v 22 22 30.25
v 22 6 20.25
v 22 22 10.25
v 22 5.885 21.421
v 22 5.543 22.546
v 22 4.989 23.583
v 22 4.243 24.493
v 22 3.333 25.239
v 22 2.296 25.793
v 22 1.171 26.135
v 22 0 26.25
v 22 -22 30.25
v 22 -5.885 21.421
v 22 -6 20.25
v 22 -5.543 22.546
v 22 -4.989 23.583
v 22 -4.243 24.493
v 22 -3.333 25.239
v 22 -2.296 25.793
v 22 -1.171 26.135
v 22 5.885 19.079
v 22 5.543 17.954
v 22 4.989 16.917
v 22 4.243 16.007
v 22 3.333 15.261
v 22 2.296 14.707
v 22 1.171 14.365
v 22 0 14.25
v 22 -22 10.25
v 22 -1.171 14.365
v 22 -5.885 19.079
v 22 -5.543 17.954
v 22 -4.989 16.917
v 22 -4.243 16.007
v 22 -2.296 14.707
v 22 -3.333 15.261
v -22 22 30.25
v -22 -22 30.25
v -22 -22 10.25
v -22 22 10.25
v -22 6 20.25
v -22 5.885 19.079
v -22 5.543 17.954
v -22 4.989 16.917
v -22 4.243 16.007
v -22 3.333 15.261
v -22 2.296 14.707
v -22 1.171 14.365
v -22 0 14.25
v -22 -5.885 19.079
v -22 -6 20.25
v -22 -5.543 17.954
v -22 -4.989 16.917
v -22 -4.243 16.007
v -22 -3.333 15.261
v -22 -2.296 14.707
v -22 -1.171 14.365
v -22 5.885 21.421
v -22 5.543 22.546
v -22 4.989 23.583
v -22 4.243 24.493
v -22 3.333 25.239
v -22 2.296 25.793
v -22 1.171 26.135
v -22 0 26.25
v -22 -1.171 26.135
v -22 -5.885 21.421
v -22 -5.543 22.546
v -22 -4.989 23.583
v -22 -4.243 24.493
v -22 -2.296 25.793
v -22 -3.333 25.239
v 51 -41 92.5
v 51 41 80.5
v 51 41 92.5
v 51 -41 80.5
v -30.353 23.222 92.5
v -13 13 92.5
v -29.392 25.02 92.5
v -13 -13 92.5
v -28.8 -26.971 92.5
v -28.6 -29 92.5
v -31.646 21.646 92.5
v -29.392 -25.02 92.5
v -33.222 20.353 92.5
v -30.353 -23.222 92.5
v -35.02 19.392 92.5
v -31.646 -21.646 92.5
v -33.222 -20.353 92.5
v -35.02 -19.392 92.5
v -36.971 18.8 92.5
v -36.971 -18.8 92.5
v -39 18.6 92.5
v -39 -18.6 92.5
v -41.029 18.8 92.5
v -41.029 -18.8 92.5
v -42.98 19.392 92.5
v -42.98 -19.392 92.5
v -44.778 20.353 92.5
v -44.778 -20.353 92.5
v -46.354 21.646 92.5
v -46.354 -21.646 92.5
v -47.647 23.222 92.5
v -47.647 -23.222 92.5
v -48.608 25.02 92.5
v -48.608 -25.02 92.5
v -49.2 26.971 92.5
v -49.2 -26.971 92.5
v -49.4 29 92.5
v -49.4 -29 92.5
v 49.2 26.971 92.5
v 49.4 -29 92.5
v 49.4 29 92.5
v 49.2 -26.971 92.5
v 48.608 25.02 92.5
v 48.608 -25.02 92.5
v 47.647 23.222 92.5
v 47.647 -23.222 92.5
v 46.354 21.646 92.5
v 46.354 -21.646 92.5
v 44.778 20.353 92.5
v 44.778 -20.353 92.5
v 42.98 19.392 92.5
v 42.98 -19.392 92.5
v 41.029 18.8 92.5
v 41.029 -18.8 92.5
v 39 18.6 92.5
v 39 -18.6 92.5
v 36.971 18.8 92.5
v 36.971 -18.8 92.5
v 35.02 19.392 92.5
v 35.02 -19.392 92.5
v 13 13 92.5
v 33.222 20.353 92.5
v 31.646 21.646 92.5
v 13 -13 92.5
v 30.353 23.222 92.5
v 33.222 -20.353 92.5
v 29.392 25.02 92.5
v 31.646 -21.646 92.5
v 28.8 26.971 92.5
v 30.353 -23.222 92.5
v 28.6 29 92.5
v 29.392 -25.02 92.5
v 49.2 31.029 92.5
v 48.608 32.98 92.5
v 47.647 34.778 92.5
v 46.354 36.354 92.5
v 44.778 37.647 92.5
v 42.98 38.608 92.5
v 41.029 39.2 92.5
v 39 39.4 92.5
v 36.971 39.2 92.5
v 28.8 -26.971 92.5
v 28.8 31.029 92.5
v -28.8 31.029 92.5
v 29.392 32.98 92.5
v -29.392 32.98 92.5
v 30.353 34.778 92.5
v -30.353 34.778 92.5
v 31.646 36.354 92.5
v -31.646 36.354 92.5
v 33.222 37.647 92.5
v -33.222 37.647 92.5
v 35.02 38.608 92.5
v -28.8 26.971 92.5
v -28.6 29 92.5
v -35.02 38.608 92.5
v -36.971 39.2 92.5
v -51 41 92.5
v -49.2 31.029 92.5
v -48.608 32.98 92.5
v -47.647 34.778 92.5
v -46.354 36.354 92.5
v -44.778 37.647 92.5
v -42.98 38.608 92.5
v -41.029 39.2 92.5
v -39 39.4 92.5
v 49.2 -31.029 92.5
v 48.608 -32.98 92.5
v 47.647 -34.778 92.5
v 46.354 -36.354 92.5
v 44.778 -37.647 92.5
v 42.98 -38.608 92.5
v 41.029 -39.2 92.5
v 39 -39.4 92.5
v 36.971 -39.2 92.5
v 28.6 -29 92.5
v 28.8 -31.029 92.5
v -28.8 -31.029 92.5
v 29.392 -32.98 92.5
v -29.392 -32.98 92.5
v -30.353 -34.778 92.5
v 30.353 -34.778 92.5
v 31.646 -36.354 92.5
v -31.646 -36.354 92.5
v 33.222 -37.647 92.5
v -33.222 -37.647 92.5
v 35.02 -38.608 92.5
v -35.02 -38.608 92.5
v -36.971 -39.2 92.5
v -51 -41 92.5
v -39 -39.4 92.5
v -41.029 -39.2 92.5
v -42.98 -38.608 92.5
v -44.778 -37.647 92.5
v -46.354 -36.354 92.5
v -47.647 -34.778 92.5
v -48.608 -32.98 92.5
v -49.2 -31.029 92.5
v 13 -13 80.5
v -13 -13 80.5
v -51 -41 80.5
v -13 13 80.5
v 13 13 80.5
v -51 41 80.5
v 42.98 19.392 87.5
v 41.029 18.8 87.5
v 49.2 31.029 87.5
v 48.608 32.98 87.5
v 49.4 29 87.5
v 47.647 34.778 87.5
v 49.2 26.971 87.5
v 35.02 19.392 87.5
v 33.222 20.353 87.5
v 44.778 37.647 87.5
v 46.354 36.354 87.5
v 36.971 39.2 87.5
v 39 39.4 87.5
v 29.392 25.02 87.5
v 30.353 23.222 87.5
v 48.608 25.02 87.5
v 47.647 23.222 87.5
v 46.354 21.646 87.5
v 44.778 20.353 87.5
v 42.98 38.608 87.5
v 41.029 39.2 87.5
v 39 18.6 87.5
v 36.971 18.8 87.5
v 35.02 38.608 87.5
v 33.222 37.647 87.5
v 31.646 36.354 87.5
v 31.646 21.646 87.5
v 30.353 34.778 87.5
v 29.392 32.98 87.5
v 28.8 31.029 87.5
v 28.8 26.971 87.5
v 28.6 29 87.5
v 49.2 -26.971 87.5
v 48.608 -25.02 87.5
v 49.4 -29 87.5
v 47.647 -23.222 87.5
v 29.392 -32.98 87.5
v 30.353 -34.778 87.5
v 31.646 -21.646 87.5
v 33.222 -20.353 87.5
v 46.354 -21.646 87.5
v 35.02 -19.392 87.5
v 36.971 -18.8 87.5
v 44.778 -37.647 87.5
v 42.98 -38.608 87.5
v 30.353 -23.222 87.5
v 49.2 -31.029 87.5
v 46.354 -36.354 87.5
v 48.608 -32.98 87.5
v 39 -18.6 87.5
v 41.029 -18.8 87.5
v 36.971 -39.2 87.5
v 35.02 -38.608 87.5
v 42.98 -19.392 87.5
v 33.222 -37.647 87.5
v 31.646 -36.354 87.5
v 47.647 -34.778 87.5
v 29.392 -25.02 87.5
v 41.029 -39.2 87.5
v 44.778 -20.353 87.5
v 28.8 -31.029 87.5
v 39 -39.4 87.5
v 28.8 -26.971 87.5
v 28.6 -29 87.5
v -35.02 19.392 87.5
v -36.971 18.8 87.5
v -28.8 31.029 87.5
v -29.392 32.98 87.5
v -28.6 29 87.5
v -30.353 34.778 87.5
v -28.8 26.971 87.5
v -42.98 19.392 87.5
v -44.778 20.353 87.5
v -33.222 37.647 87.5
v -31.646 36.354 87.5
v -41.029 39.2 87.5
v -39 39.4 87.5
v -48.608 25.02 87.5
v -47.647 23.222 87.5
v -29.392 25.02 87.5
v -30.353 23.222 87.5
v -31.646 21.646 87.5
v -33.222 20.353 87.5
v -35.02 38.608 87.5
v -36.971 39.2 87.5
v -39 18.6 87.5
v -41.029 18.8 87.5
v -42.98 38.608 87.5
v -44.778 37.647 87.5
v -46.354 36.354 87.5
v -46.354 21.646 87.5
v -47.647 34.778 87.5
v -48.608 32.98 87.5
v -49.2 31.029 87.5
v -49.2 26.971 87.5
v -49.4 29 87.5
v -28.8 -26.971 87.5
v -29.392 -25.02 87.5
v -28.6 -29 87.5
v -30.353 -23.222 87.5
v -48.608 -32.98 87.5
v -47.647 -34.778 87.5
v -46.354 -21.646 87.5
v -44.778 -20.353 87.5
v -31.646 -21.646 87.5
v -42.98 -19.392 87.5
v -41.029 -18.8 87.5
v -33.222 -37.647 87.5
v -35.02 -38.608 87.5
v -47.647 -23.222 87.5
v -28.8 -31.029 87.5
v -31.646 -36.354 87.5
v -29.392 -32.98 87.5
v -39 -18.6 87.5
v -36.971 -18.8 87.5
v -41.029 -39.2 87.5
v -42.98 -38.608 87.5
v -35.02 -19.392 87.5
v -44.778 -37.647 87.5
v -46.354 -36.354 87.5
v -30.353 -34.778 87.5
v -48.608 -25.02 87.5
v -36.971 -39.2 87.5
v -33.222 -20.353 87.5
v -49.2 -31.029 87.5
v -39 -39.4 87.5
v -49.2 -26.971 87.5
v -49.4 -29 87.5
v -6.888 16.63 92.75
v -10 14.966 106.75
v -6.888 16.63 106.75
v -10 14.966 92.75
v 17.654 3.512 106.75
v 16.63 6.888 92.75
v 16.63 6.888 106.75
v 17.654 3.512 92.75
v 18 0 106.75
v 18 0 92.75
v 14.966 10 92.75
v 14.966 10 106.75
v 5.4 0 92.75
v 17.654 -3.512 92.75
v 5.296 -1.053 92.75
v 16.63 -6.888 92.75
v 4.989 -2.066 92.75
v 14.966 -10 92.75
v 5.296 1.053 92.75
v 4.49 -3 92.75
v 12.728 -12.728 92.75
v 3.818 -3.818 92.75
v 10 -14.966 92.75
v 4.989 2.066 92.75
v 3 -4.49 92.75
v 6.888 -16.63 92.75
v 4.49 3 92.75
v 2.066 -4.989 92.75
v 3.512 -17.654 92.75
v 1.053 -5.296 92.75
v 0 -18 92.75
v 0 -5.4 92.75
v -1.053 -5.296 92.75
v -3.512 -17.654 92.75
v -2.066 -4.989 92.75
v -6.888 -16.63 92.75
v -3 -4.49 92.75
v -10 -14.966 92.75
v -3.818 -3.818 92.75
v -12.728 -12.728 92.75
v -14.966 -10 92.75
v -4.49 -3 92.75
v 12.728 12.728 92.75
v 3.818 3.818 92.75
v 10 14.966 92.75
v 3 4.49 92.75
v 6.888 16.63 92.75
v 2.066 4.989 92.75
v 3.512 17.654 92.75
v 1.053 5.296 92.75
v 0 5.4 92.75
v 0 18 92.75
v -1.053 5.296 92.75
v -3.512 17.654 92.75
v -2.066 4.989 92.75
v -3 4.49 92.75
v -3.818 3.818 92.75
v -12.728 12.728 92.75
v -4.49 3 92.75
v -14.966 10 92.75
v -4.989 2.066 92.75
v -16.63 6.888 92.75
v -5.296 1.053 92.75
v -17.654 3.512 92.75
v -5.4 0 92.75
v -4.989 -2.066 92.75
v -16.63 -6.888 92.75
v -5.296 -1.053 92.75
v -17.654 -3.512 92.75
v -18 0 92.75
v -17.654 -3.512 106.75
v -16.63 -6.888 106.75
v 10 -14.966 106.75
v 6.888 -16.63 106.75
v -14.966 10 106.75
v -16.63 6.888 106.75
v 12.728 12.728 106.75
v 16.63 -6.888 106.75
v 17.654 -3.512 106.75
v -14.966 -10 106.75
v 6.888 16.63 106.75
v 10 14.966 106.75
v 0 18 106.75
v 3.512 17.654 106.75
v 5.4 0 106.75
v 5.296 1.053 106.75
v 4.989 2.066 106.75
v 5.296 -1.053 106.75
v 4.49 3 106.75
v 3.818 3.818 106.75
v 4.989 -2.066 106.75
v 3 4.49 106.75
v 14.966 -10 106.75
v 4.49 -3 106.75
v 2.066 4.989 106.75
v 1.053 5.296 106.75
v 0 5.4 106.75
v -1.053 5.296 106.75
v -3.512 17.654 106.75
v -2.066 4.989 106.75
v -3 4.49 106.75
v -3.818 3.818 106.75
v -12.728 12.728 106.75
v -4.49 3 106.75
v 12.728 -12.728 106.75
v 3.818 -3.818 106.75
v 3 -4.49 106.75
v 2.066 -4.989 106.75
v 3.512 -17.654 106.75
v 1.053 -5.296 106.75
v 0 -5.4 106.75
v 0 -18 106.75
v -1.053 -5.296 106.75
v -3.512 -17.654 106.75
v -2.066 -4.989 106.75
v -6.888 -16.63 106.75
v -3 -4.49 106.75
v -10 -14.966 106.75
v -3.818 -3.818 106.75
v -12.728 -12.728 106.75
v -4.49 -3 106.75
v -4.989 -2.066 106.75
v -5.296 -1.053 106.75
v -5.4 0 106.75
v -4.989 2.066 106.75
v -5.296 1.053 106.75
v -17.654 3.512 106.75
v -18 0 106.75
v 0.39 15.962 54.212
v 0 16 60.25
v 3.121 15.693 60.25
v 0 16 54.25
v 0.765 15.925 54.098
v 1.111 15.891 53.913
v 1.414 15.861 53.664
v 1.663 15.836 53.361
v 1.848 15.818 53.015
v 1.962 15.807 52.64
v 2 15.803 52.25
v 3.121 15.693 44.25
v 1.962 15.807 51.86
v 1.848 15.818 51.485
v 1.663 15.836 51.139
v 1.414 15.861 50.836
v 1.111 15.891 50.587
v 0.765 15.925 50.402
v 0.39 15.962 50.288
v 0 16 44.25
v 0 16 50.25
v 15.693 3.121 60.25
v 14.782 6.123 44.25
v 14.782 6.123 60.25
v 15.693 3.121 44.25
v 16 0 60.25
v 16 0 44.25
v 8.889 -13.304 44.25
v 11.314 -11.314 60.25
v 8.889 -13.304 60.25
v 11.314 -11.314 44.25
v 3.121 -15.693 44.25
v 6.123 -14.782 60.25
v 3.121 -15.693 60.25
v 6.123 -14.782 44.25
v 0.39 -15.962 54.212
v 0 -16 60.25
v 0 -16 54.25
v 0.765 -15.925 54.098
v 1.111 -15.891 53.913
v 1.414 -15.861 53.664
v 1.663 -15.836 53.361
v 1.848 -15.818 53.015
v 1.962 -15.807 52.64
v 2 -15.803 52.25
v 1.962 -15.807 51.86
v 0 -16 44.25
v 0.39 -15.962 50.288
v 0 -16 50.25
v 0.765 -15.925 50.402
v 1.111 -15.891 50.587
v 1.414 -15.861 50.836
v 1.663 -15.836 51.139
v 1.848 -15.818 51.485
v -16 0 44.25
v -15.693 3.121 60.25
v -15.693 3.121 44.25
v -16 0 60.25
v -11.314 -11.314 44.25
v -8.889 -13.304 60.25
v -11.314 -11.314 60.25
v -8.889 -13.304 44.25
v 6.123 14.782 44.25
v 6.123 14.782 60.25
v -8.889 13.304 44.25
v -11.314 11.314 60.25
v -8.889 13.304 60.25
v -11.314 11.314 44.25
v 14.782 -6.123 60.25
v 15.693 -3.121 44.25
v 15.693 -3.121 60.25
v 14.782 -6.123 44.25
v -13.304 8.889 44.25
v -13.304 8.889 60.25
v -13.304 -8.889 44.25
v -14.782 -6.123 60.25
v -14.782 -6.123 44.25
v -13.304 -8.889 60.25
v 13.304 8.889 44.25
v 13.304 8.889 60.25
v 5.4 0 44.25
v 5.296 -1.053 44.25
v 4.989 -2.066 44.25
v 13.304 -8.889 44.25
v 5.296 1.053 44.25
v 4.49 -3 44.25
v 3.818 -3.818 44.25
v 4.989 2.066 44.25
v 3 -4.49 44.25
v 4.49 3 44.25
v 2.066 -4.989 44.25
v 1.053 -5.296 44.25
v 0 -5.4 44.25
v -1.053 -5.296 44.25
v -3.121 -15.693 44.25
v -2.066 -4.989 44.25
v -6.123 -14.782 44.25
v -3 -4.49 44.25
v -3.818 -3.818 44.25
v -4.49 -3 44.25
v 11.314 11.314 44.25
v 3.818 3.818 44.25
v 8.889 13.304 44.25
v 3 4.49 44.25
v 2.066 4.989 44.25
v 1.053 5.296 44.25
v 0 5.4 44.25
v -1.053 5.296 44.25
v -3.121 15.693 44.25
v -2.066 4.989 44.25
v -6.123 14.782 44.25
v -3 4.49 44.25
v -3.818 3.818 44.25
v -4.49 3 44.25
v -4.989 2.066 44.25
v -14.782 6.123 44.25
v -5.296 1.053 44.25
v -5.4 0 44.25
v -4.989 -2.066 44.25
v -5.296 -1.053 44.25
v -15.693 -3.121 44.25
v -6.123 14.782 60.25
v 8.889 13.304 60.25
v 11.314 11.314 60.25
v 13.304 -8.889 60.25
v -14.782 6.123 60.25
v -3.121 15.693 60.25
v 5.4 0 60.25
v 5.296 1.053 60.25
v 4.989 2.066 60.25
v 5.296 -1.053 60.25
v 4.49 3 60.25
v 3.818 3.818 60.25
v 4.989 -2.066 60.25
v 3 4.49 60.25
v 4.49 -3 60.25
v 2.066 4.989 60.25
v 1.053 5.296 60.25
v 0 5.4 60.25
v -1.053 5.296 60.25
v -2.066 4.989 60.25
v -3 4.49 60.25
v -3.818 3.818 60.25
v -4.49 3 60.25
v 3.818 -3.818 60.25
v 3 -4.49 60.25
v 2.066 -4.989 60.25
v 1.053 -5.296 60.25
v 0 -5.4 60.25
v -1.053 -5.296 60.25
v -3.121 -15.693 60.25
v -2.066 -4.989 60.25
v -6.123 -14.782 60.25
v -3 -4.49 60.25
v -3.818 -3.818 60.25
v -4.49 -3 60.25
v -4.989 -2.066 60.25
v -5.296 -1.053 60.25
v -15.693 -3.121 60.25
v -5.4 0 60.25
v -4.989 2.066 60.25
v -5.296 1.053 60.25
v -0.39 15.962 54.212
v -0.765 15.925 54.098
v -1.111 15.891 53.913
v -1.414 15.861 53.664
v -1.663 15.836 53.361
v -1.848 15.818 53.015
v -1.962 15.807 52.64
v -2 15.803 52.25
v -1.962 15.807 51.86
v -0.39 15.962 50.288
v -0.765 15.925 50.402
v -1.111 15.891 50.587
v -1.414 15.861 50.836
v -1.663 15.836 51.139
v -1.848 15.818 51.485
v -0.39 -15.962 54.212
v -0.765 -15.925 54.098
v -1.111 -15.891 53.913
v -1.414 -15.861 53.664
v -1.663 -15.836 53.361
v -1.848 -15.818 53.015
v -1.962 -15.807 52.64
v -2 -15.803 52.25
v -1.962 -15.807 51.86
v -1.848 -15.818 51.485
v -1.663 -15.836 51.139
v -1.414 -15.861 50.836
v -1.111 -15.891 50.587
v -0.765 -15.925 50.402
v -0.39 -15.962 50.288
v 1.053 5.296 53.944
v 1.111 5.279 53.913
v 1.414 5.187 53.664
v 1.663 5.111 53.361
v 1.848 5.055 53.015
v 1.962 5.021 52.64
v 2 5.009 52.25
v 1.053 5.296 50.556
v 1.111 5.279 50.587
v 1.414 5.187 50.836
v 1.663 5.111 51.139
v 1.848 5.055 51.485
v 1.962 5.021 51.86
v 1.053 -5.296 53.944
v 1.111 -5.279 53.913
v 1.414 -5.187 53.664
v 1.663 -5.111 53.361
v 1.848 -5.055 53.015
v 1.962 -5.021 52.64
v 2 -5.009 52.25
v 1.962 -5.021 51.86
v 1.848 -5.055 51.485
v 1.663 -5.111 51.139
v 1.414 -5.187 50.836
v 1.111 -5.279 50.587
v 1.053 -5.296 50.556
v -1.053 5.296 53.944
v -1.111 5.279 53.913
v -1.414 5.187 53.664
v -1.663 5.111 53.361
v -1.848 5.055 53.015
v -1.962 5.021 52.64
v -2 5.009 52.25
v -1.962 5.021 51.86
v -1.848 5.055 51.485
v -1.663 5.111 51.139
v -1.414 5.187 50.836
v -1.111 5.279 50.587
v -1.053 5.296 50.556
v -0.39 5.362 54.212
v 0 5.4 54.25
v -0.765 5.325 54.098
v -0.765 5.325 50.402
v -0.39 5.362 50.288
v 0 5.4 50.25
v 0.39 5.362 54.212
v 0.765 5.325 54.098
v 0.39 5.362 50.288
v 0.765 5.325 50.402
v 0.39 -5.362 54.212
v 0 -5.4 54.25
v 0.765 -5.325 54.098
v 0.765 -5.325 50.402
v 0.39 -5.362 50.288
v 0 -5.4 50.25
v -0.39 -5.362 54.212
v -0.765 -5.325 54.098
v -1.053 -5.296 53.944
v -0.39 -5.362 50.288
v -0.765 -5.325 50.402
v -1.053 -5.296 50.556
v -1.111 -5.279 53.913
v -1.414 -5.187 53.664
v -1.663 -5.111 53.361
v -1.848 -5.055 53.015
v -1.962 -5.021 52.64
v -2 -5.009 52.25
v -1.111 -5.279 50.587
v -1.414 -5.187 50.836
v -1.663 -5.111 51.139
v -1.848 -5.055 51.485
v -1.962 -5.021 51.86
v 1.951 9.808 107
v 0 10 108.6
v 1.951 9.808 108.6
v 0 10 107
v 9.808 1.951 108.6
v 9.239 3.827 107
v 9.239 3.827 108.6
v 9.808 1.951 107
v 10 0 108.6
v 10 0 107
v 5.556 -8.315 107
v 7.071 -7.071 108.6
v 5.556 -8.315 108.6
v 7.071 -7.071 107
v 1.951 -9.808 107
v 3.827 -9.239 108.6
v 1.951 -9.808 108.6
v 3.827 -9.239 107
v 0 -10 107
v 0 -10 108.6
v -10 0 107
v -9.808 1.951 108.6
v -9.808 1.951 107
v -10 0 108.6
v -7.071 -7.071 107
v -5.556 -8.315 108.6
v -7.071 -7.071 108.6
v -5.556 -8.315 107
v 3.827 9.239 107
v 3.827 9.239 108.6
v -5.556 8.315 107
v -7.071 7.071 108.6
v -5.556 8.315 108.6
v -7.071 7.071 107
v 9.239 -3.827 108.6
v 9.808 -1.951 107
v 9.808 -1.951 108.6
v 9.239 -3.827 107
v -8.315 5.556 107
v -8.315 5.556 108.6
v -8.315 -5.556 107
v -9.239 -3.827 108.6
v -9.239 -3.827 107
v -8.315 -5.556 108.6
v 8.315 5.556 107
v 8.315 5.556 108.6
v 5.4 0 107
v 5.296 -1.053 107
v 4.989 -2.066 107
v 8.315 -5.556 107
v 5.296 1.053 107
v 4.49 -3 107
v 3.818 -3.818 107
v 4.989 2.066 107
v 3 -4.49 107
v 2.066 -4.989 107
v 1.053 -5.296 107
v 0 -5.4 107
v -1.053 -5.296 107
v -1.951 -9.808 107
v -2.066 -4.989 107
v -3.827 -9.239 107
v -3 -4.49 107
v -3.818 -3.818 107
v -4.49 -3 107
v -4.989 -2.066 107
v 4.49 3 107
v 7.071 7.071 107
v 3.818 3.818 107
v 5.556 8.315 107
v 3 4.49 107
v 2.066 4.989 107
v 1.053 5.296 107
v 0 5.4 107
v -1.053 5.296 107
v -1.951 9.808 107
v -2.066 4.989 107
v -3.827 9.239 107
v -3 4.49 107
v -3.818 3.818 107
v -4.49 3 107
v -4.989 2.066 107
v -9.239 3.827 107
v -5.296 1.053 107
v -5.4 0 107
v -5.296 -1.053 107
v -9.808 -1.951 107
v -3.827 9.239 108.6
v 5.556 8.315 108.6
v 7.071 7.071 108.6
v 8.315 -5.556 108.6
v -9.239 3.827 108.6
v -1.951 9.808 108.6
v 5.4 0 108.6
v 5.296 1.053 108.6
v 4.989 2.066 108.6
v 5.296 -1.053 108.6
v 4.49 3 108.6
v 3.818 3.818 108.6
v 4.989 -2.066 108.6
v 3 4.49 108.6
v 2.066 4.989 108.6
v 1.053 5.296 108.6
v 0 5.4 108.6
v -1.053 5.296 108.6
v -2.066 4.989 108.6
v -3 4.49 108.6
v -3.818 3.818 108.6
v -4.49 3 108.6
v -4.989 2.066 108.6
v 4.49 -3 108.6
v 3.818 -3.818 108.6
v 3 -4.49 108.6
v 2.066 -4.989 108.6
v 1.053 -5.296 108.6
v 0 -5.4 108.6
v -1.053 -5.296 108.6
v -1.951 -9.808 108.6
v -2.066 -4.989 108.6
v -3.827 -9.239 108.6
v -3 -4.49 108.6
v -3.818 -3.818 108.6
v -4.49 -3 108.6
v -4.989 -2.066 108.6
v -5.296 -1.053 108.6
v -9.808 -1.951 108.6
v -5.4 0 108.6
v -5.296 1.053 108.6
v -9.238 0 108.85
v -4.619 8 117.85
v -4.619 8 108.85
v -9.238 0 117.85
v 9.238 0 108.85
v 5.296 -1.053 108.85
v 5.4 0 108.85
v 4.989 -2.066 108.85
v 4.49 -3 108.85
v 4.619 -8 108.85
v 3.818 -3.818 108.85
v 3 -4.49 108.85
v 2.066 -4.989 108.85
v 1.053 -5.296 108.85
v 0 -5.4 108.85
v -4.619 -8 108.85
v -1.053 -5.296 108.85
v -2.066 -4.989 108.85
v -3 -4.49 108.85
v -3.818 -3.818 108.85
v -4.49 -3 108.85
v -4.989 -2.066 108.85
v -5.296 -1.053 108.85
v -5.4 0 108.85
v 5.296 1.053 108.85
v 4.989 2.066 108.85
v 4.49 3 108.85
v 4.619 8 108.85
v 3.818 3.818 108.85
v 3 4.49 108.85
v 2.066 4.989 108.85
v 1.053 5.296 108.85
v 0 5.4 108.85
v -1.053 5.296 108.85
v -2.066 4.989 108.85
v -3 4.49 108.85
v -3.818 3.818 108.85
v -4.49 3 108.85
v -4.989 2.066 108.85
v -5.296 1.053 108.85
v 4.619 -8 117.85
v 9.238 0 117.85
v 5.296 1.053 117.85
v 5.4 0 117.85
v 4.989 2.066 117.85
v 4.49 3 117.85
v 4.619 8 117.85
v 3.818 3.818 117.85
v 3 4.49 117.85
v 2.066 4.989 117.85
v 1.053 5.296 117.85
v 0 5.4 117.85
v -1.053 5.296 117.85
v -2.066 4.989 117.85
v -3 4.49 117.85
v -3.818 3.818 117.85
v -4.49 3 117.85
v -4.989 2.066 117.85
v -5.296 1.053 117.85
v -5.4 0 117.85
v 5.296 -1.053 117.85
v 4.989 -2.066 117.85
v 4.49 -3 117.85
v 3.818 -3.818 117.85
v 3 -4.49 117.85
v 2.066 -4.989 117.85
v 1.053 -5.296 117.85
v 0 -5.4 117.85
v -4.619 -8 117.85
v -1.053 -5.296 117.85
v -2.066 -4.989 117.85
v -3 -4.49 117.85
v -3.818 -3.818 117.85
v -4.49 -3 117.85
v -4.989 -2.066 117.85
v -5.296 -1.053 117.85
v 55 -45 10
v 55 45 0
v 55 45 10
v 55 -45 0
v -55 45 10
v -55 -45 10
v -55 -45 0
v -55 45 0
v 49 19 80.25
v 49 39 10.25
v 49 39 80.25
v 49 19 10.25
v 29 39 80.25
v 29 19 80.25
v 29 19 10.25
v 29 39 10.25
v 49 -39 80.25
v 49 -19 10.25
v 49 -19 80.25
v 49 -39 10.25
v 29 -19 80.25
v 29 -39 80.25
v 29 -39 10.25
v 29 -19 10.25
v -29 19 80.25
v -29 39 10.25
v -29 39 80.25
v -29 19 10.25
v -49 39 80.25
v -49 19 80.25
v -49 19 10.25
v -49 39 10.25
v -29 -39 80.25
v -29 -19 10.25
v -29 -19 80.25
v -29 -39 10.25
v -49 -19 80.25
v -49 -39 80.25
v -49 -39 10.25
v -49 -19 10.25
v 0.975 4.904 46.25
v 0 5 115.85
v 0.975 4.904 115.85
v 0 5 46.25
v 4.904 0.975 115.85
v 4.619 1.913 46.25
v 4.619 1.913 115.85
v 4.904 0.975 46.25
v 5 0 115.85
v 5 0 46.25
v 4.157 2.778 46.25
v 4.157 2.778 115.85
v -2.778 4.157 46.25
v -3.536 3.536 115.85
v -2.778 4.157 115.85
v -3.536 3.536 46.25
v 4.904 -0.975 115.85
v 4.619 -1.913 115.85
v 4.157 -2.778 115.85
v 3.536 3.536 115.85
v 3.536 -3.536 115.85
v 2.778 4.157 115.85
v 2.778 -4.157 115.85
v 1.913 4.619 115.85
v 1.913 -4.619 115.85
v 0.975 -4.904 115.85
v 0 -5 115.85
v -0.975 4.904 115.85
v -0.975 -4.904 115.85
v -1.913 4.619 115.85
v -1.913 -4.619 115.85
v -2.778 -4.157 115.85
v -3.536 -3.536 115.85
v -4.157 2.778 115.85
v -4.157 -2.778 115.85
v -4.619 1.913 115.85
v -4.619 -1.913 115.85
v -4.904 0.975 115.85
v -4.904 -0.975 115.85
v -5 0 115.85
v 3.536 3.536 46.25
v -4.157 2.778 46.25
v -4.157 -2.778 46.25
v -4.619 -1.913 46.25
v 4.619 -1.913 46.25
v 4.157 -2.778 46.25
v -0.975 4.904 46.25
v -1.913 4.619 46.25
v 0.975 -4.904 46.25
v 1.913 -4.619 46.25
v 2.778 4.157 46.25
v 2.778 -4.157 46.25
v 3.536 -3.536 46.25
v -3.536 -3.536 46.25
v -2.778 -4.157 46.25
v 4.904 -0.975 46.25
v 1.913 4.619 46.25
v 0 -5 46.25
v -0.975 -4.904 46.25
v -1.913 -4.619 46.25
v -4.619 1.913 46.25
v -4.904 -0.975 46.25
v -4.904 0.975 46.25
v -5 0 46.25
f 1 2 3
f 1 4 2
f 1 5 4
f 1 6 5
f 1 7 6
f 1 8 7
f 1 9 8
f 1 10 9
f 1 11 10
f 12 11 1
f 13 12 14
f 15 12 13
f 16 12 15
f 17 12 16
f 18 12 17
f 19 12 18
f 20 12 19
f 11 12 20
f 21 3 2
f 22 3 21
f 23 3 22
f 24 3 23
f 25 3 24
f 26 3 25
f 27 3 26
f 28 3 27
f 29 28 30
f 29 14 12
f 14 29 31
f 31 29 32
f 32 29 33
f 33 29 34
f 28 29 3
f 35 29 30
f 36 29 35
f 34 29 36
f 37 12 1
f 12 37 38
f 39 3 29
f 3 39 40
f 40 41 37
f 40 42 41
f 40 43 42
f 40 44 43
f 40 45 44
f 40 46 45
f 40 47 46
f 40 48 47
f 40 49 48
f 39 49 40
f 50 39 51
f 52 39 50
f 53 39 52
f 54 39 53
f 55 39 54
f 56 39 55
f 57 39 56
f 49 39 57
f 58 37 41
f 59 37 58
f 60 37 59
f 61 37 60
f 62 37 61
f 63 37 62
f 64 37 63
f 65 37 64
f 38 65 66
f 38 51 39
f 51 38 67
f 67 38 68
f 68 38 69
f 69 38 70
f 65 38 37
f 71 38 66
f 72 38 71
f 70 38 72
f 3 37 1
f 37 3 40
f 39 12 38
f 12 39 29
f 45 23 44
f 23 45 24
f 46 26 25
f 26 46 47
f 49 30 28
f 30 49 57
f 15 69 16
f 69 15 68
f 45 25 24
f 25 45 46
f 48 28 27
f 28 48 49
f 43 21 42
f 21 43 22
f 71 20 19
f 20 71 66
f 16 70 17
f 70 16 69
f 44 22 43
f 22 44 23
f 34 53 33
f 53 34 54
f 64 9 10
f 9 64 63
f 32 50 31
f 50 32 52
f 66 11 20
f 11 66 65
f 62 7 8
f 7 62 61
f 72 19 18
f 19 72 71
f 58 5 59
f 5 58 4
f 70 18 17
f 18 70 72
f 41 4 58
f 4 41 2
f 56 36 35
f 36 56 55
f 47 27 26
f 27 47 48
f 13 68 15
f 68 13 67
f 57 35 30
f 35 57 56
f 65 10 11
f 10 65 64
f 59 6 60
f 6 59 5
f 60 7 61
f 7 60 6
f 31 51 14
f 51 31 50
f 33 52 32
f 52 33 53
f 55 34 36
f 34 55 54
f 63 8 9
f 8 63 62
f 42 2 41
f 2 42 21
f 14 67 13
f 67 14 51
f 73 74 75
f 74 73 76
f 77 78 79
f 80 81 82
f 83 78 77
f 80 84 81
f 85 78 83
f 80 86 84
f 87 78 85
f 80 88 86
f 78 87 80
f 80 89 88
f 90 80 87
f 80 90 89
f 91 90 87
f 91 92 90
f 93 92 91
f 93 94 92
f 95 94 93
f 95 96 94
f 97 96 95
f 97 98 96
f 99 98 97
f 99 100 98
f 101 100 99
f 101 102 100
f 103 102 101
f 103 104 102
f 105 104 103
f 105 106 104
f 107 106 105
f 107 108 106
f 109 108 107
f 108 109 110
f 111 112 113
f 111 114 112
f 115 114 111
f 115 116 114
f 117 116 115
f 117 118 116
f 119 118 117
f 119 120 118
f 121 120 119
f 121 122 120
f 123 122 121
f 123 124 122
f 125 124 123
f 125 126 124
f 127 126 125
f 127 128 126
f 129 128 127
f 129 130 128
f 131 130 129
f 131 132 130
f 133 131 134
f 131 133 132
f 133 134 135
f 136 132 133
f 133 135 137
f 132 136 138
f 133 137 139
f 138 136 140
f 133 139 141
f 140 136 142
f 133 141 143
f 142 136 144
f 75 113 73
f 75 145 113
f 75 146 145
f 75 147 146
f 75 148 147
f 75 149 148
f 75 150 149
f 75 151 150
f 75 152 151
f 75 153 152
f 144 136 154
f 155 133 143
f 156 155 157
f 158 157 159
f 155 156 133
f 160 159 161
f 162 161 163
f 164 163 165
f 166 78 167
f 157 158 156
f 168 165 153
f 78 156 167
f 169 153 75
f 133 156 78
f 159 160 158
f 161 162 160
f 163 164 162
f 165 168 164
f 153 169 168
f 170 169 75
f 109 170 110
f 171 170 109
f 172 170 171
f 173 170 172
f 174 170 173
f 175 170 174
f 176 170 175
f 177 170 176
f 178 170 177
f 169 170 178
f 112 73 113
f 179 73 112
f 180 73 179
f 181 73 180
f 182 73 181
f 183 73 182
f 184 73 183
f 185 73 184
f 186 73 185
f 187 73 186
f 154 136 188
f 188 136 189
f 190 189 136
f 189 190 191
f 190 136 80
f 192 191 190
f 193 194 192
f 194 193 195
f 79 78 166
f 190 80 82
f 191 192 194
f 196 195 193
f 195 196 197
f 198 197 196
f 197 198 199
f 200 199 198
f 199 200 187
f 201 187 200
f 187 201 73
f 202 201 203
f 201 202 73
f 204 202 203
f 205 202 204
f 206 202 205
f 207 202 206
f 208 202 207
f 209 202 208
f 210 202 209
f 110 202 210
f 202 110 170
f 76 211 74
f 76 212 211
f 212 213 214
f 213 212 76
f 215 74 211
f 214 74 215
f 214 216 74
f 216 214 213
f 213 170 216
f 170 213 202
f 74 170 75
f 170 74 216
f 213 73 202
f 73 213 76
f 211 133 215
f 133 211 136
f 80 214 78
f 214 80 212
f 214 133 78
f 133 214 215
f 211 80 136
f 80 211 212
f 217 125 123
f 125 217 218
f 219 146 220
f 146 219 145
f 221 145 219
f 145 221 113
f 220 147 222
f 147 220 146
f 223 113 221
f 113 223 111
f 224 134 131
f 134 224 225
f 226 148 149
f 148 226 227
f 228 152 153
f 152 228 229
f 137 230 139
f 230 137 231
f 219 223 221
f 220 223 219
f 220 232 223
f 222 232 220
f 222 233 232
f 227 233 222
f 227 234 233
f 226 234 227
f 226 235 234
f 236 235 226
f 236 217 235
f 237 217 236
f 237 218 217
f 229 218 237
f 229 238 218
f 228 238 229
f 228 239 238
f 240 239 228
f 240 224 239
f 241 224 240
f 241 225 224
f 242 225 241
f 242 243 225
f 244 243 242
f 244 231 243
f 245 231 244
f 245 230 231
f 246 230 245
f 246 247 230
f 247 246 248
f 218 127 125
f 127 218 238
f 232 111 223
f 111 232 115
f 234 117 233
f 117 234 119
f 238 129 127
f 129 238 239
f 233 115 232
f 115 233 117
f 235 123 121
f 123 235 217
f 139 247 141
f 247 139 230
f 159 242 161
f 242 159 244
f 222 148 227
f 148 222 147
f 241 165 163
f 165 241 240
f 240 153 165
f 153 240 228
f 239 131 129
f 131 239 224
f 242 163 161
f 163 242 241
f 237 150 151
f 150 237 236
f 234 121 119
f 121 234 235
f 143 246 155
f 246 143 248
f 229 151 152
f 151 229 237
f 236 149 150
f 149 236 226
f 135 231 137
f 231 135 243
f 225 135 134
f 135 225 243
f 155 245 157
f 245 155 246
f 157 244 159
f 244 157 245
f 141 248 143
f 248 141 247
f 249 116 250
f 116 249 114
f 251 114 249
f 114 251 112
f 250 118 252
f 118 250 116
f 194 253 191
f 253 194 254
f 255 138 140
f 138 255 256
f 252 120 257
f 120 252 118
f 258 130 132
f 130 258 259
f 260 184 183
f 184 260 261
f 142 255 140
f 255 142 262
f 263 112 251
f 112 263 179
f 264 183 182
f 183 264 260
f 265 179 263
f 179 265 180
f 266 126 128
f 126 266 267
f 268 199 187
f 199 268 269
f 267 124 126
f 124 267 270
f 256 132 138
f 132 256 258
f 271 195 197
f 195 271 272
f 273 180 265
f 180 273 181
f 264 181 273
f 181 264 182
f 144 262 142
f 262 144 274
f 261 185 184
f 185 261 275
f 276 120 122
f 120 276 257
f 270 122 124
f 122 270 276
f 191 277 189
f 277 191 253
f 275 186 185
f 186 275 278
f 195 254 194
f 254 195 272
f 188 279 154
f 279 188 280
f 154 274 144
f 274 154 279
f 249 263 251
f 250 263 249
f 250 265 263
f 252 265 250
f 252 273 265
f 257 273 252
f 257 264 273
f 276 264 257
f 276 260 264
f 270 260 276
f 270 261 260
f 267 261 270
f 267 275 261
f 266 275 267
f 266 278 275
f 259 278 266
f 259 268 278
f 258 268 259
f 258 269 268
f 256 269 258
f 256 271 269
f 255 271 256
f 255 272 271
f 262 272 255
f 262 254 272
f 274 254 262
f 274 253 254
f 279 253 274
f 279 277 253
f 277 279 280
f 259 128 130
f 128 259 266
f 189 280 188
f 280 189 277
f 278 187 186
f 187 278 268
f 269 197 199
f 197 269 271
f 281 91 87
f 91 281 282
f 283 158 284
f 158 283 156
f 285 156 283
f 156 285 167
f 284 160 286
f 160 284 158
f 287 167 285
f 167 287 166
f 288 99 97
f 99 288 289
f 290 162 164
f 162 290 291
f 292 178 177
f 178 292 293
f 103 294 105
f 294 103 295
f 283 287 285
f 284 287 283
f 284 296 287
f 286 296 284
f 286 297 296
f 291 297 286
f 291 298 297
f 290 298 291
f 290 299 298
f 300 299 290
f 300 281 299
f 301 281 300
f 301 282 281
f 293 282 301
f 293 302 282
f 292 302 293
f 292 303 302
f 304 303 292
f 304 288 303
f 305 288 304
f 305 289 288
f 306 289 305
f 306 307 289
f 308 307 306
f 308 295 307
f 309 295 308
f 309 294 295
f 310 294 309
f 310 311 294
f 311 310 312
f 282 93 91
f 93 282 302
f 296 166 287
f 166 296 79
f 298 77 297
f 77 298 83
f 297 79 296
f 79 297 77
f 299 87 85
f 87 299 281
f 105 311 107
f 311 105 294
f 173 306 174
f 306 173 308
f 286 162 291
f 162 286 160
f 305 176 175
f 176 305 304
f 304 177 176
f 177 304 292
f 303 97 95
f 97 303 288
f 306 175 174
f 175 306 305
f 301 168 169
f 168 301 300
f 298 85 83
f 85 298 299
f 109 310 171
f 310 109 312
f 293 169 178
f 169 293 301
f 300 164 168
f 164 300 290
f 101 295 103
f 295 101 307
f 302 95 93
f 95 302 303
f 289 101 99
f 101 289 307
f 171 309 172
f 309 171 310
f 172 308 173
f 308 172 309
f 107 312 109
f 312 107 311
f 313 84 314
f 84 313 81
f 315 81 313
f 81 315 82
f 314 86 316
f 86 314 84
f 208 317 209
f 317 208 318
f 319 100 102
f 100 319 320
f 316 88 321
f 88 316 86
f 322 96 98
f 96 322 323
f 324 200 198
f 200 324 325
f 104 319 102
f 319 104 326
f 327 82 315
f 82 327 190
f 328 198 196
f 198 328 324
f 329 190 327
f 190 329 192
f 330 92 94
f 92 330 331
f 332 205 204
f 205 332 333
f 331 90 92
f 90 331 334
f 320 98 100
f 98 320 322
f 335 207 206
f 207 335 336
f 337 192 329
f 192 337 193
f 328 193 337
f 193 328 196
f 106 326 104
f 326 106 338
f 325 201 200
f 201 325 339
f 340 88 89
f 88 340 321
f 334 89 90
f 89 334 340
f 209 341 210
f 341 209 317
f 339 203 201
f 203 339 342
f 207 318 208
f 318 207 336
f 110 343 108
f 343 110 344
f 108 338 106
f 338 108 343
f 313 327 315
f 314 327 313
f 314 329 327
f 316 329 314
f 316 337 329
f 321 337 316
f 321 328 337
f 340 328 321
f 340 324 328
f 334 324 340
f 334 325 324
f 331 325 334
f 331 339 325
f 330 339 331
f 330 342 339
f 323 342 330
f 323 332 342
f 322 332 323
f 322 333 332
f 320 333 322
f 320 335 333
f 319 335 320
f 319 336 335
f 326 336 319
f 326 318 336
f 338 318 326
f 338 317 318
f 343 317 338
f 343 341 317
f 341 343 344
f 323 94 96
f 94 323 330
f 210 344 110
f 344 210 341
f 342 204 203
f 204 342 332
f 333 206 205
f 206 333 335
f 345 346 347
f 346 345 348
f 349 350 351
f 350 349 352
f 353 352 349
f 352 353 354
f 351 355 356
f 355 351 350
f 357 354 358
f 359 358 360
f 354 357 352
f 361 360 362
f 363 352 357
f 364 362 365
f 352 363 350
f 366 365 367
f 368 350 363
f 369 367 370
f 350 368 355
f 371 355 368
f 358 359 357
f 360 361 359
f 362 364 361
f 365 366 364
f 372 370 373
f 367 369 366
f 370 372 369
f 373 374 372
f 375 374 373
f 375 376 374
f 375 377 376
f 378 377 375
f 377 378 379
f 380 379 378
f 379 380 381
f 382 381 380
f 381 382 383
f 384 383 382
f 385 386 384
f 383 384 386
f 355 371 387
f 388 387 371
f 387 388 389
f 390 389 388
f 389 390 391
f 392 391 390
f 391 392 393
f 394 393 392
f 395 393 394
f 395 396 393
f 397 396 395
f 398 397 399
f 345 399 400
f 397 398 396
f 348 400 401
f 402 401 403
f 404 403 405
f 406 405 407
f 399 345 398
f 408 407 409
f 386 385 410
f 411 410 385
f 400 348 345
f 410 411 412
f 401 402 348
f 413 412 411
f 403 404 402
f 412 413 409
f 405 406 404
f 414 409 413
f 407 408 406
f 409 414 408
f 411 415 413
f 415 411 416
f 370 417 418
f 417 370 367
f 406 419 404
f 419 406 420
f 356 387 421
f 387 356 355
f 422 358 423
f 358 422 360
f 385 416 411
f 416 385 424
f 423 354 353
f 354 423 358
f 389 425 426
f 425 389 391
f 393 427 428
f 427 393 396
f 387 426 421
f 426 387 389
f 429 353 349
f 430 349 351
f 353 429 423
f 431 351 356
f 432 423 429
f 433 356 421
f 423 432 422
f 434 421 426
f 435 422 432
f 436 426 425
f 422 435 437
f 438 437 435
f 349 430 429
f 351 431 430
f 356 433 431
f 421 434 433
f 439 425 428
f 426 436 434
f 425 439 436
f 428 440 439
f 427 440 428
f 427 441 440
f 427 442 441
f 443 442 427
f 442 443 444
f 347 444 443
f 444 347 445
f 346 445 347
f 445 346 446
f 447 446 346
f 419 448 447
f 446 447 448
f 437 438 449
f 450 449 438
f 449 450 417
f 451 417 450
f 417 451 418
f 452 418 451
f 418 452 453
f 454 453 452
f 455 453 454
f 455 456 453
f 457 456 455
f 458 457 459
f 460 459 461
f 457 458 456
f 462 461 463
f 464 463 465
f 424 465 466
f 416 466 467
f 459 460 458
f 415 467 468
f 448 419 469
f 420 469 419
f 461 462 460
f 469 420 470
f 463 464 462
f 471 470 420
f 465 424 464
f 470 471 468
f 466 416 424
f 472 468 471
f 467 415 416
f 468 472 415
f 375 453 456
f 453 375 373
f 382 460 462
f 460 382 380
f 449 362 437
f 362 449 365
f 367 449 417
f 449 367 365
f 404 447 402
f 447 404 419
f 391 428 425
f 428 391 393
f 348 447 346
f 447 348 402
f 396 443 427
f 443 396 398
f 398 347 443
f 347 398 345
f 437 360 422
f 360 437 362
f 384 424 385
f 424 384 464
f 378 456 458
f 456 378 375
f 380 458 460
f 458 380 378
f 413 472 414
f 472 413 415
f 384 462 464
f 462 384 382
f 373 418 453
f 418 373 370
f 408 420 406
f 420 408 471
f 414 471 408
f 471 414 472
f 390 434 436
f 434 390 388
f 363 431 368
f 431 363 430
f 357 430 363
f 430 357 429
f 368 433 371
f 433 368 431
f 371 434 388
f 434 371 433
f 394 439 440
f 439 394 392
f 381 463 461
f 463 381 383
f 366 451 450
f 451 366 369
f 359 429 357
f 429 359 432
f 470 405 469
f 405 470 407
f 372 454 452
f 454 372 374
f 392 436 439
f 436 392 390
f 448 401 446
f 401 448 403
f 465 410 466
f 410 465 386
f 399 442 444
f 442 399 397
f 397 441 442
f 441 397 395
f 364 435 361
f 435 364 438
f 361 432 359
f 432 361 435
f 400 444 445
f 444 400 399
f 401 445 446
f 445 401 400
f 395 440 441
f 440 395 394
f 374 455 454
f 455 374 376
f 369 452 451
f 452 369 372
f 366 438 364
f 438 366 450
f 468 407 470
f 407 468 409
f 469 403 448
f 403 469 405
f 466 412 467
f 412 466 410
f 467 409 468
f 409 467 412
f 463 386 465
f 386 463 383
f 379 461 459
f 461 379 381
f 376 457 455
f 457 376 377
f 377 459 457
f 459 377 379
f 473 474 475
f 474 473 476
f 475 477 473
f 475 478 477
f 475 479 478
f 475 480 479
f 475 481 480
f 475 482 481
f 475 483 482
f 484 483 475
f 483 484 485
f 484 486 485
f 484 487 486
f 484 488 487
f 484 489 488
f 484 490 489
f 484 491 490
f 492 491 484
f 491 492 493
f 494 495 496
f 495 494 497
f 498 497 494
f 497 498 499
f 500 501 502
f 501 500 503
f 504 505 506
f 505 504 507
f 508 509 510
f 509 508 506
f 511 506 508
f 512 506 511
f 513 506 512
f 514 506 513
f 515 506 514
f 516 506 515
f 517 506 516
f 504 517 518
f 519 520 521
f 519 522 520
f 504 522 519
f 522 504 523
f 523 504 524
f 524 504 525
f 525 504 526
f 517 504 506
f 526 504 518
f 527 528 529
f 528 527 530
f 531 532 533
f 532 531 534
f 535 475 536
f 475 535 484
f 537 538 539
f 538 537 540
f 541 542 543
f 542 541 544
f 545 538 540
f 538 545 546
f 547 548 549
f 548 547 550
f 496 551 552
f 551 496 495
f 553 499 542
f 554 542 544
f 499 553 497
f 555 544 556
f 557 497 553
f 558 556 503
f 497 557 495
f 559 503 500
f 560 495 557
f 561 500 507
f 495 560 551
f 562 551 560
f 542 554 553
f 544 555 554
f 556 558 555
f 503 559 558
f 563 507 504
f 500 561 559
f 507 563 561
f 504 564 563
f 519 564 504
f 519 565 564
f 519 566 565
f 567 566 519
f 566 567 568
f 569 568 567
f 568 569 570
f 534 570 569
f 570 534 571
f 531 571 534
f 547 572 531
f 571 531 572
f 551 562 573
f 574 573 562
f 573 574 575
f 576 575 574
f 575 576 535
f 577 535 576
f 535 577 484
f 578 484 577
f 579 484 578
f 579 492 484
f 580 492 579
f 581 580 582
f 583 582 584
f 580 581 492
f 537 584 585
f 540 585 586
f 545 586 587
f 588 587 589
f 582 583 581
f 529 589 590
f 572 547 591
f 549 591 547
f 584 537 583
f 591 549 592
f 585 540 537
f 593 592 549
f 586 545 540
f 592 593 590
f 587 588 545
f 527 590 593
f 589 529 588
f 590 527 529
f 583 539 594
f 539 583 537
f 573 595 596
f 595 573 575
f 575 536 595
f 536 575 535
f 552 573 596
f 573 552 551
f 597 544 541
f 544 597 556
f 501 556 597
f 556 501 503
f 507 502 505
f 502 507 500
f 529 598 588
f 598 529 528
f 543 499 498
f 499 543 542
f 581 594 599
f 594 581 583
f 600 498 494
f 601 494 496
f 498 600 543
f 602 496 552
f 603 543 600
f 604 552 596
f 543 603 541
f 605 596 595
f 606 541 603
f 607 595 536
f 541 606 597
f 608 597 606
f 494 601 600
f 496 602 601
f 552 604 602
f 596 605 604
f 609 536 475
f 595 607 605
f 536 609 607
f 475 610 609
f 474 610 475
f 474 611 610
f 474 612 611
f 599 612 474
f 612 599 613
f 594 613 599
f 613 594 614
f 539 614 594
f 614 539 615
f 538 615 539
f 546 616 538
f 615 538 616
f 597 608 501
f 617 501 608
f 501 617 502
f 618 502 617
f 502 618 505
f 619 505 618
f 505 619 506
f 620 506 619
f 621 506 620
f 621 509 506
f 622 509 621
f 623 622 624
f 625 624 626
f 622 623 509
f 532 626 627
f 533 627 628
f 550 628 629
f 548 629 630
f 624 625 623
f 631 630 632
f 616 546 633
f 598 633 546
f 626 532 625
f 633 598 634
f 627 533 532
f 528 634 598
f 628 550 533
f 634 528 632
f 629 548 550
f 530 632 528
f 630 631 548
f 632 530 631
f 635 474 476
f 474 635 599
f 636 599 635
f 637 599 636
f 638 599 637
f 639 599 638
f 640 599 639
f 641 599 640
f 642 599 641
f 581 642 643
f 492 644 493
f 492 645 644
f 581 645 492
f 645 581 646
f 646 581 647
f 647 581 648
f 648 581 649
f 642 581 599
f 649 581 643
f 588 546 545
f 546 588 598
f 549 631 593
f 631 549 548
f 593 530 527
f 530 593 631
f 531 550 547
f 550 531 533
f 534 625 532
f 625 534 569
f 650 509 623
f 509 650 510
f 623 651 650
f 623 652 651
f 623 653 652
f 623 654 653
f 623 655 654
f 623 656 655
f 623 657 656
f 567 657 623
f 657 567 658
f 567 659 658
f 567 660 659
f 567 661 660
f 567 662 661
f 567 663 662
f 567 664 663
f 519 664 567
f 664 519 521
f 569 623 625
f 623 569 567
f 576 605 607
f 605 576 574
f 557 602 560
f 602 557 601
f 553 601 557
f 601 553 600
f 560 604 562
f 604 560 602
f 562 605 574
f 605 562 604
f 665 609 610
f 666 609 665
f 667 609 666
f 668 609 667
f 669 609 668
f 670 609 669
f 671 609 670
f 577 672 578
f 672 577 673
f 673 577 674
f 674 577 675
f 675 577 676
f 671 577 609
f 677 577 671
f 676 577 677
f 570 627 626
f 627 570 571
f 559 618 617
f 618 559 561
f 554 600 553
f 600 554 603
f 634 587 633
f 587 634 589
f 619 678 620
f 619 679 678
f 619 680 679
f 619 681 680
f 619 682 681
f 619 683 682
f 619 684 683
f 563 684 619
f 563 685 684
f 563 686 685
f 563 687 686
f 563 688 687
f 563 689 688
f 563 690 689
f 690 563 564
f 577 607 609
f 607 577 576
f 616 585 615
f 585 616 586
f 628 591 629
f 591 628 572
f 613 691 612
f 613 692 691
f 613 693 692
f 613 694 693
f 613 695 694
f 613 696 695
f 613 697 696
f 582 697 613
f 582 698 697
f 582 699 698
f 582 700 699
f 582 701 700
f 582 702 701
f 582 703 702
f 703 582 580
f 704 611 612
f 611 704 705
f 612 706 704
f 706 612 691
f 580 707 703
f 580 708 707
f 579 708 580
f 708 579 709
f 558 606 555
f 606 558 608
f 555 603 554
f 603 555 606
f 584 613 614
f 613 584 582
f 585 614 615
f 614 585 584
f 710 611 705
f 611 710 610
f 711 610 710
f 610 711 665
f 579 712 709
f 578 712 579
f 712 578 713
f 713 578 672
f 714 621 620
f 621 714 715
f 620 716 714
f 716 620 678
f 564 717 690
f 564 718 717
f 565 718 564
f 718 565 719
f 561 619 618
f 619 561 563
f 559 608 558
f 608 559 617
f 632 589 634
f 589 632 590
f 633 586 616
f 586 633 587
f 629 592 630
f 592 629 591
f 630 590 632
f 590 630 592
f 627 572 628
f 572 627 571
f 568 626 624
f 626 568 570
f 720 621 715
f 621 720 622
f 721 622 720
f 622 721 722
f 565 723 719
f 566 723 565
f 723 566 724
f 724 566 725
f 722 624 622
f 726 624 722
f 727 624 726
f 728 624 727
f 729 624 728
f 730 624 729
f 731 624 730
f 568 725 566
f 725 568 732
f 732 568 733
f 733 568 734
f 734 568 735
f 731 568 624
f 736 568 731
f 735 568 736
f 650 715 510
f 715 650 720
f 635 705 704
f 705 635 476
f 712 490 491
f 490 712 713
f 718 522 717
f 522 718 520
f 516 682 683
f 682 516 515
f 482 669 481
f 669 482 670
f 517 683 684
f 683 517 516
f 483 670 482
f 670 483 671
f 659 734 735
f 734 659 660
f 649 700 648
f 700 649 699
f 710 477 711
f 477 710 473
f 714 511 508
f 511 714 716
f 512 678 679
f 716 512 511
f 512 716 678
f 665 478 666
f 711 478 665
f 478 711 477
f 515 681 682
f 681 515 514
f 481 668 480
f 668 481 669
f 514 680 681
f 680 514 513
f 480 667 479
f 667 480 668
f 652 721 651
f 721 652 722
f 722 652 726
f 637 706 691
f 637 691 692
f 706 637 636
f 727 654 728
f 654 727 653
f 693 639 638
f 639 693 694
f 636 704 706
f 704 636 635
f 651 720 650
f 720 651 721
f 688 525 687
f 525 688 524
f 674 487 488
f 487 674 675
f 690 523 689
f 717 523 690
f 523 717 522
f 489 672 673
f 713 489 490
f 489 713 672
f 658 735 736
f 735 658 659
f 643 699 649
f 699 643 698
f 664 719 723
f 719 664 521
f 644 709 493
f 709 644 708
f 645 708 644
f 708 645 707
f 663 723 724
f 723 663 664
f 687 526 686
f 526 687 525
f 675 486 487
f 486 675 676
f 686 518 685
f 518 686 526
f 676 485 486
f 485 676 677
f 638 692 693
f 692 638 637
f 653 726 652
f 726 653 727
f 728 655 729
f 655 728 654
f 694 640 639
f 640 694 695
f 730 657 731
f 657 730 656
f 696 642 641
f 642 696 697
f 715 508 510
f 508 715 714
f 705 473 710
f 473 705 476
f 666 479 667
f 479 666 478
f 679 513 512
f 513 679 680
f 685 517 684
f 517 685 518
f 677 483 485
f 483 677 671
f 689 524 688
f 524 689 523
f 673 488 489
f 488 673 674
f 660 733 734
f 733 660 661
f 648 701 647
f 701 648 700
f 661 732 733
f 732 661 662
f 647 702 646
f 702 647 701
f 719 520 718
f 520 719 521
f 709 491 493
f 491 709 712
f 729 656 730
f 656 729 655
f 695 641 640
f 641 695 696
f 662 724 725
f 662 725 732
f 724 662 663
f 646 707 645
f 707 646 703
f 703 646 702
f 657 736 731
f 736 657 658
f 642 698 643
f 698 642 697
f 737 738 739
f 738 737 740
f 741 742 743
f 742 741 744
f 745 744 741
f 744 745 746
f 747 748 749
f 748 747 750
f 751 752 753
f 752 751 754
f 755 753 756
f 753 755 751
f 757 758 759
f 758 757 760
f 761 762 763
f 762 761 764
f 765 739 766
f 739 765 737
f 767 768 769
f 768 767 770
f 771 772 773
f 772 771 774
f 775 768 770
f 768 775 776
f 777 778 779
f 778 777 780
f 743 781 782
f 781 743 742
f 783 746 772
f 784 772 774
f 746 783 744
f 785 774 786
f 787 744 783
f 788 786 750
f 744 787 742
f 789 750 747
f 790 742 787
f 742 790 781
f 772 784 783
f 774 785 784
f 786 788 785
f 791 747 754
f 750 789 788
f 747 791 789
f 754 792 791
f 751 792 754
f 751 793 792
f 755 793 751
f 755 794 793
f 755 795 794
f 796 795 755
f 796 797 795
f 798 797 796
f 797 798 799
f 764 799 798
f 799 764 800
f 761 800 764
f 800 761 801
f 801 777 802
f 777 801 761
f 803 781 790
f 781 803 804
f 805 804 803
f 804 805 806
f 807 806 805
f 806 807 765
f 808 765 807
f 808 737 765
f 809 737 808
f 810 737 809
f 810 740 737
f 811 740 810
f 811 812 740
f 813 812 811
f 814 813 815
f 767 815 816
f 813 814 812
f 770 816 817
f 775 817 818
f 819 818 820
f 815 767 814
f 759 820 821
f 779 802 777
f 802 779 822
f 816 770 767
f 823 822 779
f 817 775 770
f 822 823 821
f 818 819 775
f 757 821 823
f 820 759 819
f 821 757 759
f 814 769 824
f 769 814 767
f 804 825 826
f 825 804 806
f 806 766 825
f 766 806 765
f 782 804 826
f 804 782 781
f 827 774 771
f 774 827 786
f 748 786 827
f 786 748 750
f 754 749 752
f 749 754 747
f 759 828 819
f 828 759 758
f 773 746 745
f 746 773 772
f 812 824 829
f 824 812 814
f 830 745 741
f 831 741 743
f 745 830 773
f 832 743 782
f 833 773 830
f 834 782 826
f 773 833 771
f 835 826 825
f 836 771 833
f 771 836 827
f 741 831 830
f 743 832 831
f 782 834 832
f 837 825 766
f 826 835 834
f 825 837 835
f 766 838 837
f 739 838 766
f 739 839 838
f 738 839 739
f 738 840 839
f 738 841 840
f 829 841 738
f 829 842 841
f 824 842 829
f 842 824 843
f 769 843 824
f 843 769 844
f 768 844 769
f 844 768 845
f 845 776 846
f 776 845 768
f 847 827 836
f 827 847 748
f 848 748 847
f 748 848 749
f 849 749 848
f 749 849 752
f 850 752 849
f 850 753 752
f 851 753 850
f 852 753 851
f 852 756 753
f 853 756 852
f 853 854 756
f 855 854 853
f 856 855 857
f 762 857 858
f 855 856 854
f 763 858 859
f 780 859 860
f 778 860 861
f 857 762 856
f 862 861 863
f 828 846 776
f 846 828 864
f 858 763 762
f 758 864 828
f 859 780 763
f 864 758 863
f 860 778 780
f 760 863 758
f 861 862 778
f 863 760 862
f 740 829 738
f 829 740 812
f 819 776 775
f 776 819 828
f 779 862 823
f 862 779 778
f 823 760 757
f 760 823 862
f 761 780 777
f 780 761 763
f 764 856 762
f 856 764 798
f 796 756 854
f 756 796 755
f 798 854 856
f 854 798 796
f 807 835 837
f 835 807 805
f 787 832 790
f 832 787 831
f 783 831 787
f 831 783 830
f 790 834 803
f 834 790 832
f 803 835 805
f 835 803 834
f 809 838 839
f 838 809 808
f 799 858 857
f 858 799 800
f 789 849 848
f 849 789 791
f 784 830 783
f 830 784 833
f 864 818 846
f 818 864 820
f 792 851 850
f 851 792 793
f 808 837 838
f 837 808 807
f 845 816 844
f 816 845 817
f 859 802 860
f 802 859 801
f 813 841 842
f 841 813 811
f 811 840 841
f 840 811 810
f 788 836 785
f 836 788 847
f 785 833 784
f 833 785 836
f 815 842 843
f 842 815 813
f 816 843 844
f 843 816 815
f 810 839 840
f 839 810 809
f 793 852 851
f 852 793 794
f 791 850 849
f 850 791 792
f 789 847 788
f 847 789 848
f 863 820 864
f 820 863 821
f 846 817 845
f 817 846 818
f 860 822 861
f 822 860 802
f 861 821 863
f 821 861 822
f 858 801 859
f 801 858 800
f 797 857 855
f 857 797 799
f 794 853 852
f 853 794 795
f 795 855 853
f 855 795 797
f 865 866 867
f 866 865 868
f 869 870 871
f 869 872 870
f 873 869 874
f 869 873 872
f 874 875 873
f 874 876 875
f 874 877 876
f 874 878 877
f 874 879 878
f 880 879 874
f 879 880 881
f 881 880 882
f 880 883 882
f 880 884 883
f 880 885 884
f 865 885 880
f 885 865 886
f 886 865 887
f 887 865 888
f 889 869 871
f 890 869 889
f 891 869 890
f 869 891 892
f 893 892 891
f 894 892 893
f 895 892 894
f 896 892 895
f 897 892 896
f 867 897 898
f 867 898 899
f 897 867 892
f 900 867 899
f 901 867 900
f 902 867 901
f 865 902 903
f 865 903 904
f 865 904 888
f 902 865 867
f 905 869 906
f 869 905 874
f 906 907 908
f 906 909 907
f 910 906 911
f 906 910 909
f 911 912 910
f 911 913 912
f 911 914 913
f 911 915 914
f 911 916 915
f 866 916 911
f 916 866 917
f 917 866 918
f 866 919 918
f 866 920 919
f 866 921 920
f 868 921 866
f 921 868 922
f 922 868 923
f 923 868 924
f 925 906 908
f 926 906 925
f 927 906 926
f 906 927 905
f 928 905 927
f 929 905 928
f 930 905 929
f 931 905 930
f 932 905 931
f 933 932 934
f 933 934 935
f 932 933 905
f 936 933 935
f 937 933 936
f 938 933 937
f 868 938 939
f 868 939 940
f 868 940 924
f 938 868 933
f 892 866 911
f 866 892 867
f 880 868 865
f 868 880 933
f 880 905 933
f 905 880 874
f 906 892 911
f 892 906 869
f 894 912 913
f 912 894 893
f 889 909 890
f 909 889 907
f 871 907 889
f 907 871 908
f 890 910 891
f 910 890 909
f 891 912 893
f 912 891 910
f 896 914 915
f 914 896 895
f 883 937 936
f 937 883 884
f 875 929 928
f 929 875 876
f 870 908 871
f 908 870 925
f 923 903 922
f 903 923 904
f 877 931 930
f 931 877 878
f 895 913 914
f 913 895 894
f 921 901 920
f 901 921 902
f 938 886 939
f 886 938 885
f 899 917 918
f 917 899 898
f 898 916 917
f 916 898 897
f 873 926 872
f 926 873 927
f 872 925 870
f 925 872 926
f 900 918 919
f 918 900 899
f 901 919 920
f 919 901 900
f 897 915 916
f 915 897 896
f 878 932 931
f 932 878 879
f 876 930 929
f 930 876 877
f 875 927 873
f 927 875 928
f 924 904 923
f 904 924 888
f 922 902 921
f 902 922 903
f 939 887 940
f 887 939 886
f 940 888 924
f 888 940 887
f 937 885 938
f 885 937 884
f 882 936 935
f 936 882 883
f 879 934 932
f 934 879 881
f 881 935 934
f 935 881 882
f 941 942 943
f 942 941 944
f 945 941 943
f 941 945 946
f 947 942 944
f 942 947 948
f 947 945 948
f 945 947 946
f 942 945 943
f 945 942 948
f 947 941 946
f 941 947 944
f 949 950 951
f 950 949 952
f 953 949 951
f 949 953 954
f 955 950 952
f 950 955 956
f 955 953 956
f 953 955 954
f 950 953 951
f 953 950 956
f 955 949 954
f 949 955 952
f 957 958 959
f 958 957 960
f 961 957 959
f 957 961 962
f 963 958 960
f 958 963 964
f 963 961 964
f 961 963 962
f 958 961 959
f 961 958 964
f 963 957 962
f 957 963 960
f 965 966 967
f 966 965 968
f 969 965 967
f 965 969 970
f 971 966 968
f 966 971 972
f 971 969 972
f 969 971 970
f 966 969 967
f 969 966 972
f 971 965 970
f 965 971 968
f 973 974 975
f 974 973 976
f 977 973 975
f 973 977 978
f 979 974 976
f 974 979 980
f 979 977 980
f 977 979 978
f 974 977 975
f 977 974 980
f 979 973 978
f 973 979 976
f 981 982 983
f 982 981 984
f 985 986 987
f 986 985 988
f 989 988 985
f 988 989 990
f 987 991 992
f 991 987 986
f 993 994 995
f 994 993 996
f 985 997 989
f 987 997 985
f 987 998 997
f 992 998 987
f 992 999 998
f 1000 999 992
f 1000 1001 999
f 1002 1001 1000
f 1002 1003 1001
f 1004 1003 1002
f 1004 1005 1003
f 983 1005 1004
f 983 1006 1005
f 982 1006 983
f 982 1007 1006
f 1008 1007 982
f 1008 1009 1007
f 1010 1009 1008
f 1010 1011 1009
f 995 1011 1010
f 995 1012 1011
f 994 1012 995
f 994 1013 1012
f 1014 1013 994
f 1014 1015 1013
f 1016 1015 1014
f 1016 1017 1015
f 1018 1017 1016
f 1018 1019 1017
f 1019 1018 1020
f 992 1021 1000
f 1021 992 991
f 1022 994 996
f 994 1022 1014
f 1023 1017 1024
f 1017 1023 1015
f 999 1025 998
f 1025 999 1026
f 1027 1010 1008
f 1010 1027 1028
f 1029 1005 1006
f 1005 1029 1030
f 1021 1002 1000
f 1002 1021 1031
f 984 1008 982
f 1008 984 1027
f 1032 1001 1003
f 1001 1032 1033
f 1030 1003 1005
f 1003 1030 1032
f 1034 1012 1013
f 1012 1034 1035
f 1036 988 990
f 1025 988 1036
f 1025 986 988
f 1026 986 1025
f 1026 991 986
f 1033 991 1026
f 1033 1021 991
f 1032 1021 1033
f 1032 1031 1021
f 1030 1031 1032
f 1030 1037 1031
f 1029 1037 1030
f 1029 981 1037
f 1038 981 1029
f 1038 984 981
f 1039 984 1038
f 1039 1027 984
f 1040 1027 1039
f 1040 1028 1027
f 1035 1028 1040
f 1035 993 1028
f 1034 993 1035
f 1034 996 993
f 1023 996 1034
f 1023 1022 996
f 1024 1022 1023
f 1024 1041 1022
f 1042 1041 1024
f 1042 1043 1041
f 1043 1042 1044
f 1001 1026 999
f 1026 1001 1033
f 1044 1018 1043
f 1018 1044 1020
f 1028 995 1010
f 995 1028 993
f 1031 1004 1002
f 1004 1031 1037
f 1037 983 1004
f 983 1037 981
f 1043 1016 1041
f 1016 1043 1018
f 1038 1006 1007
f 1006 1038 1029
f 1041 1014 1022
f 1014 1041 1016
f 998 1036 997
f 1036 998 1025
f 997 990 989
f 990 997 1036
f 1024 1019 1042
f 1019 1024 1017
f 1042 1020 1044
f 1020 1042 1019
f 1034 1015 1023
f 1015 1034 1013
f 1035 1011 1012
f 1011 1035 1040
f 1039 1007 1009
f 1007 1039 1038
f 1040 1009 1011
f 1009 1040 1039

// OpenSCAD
$fn = 32;

// ------------------------------------------------------------------------
// Arbor press fixture: screw d10, posts 70 mm, gap 14 mm
// Every part is its own module, assembly() places every instance.
// ------------------------------------------------------------------------

// --- part 1 ---
module press_bed() {
  difference() {
    translate([-55, -45, 0]) cube([110, 90, 10]);
  }
}

// --- part 2 ---
module anvil_block() {
  difference() {
    translate([-22, -22, 0]) cube([44, 44, 20]);
    translate([0, 0, 10]) rotate([0, 90, 0]) cylinder(h = 46, d = 12, center = true);
  }
}

// --- part 3 ---
module press_post_a() {
  translate([-10, -10, 0]) cube([20, 20, 70]);
}

// --- part 4 ---
module press_post_b() {
  translate([-10, -10, 0]) cube([20, 20, 70]);
}

// --- part 5 ---
module press_post_c() {
  translate([-10, -10, 0]) cube([20, 20, 70]);
}

// --- part 6 ---
module press_post_d() {
  translate([-10, -10, 0]) cube([20, 20, 70]);
}

// --- part 7 ---
module press_frame() {
  difference() {
    translate([-51, -41, 0]) cube([102, 82, 12]);
    translate([-13, -13, -1]) cube([26, 26, 14]);
    translate([39, 29, 7]) cylinder(h = 6, d = 20.8);
    translate([39, -29, 7]) cylinder(h = 6, d = 20.8);
    translate([-39, 29, 7]) cylinder(h = 6, d = 20.8);
    translate([-39, -29, 7]) cylinder(h = 6, d = 20.8);
  }
}

// --- part 8 ---
module guide_ring() {
  difference() {
      translate([0, 0, 0]) cylinder(h = 14, d = 36);
      translate([0, 0, -1]) cylinder(h = 16, d = 10.8);
    }
}

// --- part 9 ---
module press_screw() {
  translate([0, 0, -34.8]) cylinder(h = 69.6, d = 10);
}

// --- part 10 ---
module press_head() {
  difference() {
    cylinder(h = 16, d = 32);
    translate([0, 0, -1]) cylinder(h = 18, d = 10.8);
    translate([0, 0, 8]) rotate([90, 0, 0]) cylinder(h = 34, d = 4, center = true);
  }
}

// --- part 11 ---
module nut_washer() {
  difference() {
      translate([0, 0, 0]) cylinder(h = 1.6, d = 20);
      translate([0, 0, -1]) cylinder(h = 3.6, d = 10.8);
    }
}

// --- part 12 ---
module press_nut() {
  difference() {
    linear_extrude(height = 9) polygon(points = [[9.238, 0], [4.619, 8], [-4.619, 8], [-9.238, 0], [-4.619, -8], [4.619, -8]]);
    translate([0, 0, -1]) cylinder(h = 11, d = 10.8);
  }
}

// --- assembly ---
module assembly() {
  color([0.80, 0.24, 0.20]) translate([0, 0, 0]) rotate([0, 0, 0]) press_bed();
  color([0.20, 0.45, 0.75]) translate([0, 0, 10.25]) rotate([0, 0, 0]) anvil_block();
  color([0.25, 0.62, 0.32]) translate([39, 29, 10.25]) rotate([0, 0, 0]) press_post_a();
  color([0.92, 0.70, 0.18]) translate([39, -29, 10.25]) rotate([0, 0, 0]) press_post_b();
  color([0.58, 0.35, 0.70]) translate([-39, 29, 10.25]) rotate([0, 0, 0]) press_post_c();
  color([0.16, 0.66, 0.66]) translate([-39, -29, 10.25]) rotate([0, 0, 0]) press_post_d();
  color([0.85, 0.48, 0.18]) translate([0, 0, 80.5]) rotate([0, 0, 0]) press_frame();
  color([0.55, 0.60, 0.65]) translate([0, 0, 92.75]) rotate([0, 0, 0]) guide_ring();
  color([0.75, 0.30, 0.55]) translate([0, 0, 81.05]) rotate([0, 0, 0]) press_screw();
  color([0.42, 0.52, 0.28]) translate([0, 0, 44.25]) rotate([0, 0, 0]) press_head();
  color([0.80, 0.24, 0.20]) translate([0, 0, 107]) rotate([0, 0, 0]) nut_washer();
  color([0.20, 0.45, 0.75]) translate([0, 0, 108.85]) rotate([0, 0, 0]) press_nut();
}

assembly();
